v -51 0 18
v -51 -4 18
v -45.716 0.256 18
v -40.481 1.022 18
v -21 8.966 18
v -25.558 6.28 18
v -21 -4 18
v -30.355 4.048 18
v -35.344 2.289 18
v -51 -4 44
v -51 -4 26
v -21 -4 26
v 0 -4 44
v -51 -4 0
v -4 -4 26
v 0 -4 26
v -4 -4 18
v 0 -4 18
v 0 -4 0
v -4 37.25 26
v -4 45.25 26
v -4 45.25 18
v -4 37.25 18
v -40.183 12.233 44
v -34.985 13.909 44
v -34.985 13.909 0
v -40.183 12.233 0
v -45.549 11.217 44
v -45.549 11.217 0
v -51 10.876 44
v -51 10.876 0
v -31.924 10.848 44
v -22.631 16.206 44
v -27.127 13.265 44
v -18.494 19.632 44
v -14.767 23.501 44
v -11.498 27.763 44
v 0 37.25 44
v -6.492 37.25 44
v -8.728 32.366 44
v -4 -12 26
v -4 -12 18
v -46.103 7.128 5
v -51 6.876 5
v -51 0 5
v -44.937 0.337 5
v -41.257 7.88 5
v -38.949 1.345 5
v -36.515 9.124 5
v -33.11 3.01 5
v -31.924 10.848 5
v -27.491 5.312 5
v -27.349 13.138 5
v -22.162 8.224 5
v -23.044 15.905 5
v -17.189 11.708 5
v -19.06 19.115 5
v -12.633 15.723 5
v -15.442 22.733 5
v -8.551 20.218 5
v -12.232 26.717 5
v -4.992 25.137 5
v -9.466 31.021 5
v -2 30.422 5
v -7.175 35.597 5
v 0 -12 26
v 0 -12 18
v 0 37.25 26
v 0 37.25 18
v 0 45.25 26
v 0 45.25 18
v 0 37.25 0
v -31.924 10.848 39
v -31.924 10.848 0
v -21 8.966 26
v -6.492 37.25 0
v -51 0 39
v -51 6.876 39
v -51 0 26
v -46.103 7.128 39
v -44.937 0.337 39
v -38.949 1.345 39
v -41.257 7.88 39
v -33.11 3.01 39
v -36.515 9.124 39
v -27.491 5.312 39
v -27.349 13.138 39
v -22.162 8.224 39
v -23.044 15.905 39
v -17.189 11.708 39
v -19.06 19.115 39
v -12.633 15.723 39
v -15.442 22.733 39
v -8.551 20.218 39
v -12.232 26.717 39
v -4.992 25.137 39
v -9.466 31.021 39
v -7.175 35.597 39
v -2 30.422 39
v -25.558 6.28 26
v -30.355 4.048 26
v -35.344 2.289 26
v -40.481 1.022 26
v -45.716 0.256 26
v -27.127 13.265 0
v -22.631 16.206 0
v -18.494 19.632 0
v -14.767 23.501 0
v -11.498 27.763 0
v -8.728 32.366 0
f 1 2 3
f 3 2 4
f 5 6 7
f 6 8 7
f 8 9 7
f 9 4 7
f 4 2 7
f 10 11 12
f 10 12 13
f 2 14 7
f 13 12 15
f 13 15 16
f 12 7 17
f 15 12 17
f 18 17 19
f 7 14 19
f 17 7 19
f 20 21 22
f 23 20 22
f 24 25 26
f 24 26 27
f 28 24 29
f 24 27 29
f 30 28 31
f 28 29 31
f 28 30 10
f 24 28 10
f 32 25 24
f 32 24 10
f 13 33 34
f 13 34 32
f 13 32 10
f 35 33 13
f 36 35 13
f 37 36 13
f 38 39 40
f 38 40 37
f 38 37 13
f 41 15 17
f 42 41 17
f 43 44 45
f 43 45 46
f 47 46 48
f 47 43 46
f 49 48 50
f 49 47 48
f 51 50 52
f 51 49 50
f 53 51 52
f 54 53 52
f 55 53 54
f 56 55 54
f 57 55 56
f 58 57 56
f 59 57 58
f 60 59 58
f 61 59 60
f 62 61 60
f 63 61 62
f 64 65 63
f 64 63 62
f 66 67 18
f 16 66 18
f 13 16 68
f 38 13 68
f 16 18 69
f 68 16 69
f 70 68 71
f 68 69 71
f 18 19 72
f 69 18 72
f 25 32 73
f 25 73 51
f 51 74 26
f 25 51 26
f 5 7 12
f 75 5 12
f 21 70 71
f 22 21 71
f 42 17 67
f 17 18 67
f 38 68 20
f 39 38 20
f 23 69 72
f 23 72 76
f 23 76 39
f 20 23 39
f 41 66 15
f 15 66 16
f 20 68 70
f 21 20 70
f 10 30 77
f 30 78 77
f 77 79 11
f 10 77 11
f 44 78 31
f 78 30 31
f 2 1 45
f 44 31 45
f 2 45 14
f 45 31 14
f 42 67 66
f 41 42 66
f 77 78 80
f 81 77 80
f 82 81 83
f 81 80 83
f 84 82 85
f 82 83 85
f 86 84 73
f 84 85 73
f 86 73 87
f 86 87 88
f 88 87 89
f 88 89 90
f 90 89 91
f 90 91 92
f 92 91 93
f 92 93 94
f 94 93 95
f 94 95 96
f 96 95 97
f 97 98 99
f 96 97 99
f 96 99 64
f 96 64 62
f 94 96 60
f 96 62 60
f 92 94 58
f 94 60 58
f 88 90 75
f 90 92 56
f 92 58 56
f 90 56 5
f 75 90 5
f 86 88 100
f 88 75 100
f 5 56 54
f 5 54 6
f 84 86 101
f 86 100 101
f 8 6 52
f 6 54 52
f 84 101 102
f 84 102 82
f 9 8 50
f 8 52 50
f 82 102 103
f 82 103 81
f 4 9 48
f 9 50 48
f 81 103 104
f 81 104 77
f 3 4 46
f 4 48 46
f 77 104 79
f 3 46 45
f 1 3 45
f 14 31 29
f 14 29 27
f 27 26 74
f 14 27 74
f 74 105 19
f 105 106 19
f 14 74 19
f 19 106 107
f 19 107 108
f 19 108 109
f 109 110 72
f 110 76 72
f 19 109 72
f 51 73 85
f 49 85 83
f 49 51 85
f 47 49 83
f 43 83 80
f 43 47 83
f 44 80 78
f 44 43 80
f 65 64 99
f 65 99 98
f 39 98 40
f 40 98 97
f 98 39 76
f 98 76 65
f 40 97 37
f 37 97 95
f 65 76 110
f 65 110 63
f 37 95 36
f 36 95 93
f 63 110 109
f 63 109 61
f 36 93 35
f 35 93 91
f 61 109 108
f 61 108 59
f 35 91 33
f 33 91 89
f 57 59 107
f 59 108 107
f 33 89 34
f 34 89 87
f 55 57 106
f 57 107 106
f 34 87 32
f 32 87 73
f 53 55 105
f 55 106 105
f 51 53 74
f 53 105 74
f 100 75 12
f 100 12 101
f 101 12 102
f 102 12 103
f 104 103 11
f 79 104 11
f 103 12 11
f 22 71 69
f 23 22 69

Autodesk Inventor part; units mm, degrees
ref_plane "YZ Plane" through (0, 0, 0) normal (1, 0, 0) x (0, 1, 0)
ref_plane "XZ Plane" through (0, 0, 0) normal (0, 1, 0) x (-1, 0, 0)
ref_plane "XY Plane" through (0, 0, 0) normal (0, 0, 1) x (1, 0, 0)
sketch "Sketch1" plane through (0, 0, 0) normal (0, 0, 1) x (1, 0, 0)
  line L0 (0, 0) -> (-53, 0)
  line L1 (-53, 0) -> (-53, 33.25) construction
  line L2 (-53, 33.25) -> (0, 33.25)
  line L3 (0, 33.25) -> (0, 0)
  line L4 (-51, 33.25) -> (-51, 0)
  line L5 (0, 0) -> (-51, 0)
  line L6 (-51, 0) -> (-51, -4)
  line L7 (-51, -4) -> (0, -4)
  line L8 (0, -4) -> (0, 0)
  circle A0 centre (-51, 54.6729) radius 54.6729
  line L9 (-26.7487, 5.6729) -> (-2, 30.4216)
  line L10 (-2, 30.4216) -> (-4.8284, 33.25)
  line L11 (-4.8284, 33.25) -> (-29.5772, 8.5013)
  line L12 (-29.5772, 8.5013) -> (-26.7487, 5.6729) construction
  circle A1 centre (-51, 54.6729) radius 47.7965
  line L13 (-29.5772, 8.5013) -> (-31.924, 10.8481)
  circle A2 centre (-51, 54.6729) radius 43.7965
  line L14 (-31.924, 10.8481) -> (-34.9853, 13.9094)
  line L15 (-51, 33.25) -> (0, 33.25)
  line L16 (0, 33.25) -> (0, 37.25)
  line L17 (0, 37.25) -> (-51, 37.25)
  line L18 (-51, 37.25) -> (-51, 33.25)
  line L19 (-4.8284, 33.25) -> (-8.8284, 37.25)
  point P0 (-51, 10.8764)
  point P1 (-51, 6.8764)
  point P2 (-8.2734, 33.25)
  point P3 (-6.4922, 37.25)
  point P4 (-7.1753, 35.5969)
  point P5 (-0.699, 33.25)
  point P6 (0, 34.972)
  dimension "d22" = 95.5929
  dimension "d23" = 87.5929
  dimension "d0" = 53
  dimension "d5" = 51
  dimension "d13" = 4
  dimension "d18" = 35
  dimension "d19" = 4
  dimension "d20" = 2
  dimension "d21" = 45
  dimension "d24" = 4
extrude "Extrusion1" add sketch "Sketch1" along normal blind 44 contours L8 L7 L6 L0 | L0 A0 L2 L3 | L2 A0 L16 | L4 A2 L14 A1 | A0 L10 L2 | L2 L19 A1 L17 L16 A0
extrude "Extrusion2" add sketch "Sketch1" along normal blind 5 contours L8 L7 L6 L0 | L0 A0 L2 L3 | L4 A1 L13 L11 L10 L9 A0 | L4 A2 L14 A1 | L9 A0 | A0 L10 L2 | A1 L11 L13 | L11 A1 L2 | L2 A1 L19
extrude "Extrusion3" add sketch "Sketch1" against normal blind 5 from surface at 44 contours L0 A0 L2 L3 | L4 A1 L13 L11 L10 L9 A0 | L4 A2 L14 A1 | L9 A0 | A0 L10 L2 | L2 L19 A1 L17 L16 A0 | A1 L11 L13 | L11 A1 L2 | L2 A1 L19
sketch "Sketch3" plane through (0, -4, 0) normal (1, 0, 0) x (0, 0, -1)
  line L0 (0, 0) -> (0, 41.25) construction
  line L1 (0, 41.25) -> (-44, 41.25) construction
  line L2 (-44, 0) -> (-44, 41.25) construction
  line L3 (0, 0) -> (-44, 0) construction
  line L4 (-26, 0) -> (-18, 0)
  line L5 (-18, 0) -> (-18, -8)
  line L6 (-18, -8) -> (-26, -8)
  line L7 (-26, -8) -> (-26, 0)
  line L8 (-26, 49.25) -> (-18, 49.25)
  line L9 (-18, 49.25) -> (-18, 41.25)
  line L10 (-18, 41.25) -> (-26, 41.25)
  line L11 (-26, 41.25) -> (-26, 49.25)
  line L12 (-26, 0) -> (-18, -8) construction
  line L13 (-26, 49.25) -> (-18, 41.25) construction
  point P0 (0, 4)
  point P1 (-22, 0)
  point P2 (-22, 41.25)
  point P3 (-22, -4)
  point P4 (-22, 45.25)
  dimension "d33" = 8
  dimension "d34" = 8
  dimension "d35" = 8
  dimension "d36" = 8
extrude "Extrusion5" add sketch "Sketch3" against normal blind 4
sketch "Sketch2" plane through (-51, -4, 0) normal (0, -1, 0) x (1, 0, 0)
  line L0 (30, 26) -> (0, 26)
  line L1 (0, 26) -> (0, 18)
  line L2 (0, 18) -> (30, 18)
  line L3 (30, 18) -> (30, 26)
  line L4 (0, 0) -> (0, 44) construction
  point P0 (51, 0)
  point P1 (0, 22)
  dimension "d29" = 30
  dimension "d30" = 8
extrude "Extrusion4" cut sketch "Sketch2" against normal up to surface
fillet "Fillet2" [suppressed]
chamfer "Chamfer2" [suppressed]
properties part number "Piece-Catch"
